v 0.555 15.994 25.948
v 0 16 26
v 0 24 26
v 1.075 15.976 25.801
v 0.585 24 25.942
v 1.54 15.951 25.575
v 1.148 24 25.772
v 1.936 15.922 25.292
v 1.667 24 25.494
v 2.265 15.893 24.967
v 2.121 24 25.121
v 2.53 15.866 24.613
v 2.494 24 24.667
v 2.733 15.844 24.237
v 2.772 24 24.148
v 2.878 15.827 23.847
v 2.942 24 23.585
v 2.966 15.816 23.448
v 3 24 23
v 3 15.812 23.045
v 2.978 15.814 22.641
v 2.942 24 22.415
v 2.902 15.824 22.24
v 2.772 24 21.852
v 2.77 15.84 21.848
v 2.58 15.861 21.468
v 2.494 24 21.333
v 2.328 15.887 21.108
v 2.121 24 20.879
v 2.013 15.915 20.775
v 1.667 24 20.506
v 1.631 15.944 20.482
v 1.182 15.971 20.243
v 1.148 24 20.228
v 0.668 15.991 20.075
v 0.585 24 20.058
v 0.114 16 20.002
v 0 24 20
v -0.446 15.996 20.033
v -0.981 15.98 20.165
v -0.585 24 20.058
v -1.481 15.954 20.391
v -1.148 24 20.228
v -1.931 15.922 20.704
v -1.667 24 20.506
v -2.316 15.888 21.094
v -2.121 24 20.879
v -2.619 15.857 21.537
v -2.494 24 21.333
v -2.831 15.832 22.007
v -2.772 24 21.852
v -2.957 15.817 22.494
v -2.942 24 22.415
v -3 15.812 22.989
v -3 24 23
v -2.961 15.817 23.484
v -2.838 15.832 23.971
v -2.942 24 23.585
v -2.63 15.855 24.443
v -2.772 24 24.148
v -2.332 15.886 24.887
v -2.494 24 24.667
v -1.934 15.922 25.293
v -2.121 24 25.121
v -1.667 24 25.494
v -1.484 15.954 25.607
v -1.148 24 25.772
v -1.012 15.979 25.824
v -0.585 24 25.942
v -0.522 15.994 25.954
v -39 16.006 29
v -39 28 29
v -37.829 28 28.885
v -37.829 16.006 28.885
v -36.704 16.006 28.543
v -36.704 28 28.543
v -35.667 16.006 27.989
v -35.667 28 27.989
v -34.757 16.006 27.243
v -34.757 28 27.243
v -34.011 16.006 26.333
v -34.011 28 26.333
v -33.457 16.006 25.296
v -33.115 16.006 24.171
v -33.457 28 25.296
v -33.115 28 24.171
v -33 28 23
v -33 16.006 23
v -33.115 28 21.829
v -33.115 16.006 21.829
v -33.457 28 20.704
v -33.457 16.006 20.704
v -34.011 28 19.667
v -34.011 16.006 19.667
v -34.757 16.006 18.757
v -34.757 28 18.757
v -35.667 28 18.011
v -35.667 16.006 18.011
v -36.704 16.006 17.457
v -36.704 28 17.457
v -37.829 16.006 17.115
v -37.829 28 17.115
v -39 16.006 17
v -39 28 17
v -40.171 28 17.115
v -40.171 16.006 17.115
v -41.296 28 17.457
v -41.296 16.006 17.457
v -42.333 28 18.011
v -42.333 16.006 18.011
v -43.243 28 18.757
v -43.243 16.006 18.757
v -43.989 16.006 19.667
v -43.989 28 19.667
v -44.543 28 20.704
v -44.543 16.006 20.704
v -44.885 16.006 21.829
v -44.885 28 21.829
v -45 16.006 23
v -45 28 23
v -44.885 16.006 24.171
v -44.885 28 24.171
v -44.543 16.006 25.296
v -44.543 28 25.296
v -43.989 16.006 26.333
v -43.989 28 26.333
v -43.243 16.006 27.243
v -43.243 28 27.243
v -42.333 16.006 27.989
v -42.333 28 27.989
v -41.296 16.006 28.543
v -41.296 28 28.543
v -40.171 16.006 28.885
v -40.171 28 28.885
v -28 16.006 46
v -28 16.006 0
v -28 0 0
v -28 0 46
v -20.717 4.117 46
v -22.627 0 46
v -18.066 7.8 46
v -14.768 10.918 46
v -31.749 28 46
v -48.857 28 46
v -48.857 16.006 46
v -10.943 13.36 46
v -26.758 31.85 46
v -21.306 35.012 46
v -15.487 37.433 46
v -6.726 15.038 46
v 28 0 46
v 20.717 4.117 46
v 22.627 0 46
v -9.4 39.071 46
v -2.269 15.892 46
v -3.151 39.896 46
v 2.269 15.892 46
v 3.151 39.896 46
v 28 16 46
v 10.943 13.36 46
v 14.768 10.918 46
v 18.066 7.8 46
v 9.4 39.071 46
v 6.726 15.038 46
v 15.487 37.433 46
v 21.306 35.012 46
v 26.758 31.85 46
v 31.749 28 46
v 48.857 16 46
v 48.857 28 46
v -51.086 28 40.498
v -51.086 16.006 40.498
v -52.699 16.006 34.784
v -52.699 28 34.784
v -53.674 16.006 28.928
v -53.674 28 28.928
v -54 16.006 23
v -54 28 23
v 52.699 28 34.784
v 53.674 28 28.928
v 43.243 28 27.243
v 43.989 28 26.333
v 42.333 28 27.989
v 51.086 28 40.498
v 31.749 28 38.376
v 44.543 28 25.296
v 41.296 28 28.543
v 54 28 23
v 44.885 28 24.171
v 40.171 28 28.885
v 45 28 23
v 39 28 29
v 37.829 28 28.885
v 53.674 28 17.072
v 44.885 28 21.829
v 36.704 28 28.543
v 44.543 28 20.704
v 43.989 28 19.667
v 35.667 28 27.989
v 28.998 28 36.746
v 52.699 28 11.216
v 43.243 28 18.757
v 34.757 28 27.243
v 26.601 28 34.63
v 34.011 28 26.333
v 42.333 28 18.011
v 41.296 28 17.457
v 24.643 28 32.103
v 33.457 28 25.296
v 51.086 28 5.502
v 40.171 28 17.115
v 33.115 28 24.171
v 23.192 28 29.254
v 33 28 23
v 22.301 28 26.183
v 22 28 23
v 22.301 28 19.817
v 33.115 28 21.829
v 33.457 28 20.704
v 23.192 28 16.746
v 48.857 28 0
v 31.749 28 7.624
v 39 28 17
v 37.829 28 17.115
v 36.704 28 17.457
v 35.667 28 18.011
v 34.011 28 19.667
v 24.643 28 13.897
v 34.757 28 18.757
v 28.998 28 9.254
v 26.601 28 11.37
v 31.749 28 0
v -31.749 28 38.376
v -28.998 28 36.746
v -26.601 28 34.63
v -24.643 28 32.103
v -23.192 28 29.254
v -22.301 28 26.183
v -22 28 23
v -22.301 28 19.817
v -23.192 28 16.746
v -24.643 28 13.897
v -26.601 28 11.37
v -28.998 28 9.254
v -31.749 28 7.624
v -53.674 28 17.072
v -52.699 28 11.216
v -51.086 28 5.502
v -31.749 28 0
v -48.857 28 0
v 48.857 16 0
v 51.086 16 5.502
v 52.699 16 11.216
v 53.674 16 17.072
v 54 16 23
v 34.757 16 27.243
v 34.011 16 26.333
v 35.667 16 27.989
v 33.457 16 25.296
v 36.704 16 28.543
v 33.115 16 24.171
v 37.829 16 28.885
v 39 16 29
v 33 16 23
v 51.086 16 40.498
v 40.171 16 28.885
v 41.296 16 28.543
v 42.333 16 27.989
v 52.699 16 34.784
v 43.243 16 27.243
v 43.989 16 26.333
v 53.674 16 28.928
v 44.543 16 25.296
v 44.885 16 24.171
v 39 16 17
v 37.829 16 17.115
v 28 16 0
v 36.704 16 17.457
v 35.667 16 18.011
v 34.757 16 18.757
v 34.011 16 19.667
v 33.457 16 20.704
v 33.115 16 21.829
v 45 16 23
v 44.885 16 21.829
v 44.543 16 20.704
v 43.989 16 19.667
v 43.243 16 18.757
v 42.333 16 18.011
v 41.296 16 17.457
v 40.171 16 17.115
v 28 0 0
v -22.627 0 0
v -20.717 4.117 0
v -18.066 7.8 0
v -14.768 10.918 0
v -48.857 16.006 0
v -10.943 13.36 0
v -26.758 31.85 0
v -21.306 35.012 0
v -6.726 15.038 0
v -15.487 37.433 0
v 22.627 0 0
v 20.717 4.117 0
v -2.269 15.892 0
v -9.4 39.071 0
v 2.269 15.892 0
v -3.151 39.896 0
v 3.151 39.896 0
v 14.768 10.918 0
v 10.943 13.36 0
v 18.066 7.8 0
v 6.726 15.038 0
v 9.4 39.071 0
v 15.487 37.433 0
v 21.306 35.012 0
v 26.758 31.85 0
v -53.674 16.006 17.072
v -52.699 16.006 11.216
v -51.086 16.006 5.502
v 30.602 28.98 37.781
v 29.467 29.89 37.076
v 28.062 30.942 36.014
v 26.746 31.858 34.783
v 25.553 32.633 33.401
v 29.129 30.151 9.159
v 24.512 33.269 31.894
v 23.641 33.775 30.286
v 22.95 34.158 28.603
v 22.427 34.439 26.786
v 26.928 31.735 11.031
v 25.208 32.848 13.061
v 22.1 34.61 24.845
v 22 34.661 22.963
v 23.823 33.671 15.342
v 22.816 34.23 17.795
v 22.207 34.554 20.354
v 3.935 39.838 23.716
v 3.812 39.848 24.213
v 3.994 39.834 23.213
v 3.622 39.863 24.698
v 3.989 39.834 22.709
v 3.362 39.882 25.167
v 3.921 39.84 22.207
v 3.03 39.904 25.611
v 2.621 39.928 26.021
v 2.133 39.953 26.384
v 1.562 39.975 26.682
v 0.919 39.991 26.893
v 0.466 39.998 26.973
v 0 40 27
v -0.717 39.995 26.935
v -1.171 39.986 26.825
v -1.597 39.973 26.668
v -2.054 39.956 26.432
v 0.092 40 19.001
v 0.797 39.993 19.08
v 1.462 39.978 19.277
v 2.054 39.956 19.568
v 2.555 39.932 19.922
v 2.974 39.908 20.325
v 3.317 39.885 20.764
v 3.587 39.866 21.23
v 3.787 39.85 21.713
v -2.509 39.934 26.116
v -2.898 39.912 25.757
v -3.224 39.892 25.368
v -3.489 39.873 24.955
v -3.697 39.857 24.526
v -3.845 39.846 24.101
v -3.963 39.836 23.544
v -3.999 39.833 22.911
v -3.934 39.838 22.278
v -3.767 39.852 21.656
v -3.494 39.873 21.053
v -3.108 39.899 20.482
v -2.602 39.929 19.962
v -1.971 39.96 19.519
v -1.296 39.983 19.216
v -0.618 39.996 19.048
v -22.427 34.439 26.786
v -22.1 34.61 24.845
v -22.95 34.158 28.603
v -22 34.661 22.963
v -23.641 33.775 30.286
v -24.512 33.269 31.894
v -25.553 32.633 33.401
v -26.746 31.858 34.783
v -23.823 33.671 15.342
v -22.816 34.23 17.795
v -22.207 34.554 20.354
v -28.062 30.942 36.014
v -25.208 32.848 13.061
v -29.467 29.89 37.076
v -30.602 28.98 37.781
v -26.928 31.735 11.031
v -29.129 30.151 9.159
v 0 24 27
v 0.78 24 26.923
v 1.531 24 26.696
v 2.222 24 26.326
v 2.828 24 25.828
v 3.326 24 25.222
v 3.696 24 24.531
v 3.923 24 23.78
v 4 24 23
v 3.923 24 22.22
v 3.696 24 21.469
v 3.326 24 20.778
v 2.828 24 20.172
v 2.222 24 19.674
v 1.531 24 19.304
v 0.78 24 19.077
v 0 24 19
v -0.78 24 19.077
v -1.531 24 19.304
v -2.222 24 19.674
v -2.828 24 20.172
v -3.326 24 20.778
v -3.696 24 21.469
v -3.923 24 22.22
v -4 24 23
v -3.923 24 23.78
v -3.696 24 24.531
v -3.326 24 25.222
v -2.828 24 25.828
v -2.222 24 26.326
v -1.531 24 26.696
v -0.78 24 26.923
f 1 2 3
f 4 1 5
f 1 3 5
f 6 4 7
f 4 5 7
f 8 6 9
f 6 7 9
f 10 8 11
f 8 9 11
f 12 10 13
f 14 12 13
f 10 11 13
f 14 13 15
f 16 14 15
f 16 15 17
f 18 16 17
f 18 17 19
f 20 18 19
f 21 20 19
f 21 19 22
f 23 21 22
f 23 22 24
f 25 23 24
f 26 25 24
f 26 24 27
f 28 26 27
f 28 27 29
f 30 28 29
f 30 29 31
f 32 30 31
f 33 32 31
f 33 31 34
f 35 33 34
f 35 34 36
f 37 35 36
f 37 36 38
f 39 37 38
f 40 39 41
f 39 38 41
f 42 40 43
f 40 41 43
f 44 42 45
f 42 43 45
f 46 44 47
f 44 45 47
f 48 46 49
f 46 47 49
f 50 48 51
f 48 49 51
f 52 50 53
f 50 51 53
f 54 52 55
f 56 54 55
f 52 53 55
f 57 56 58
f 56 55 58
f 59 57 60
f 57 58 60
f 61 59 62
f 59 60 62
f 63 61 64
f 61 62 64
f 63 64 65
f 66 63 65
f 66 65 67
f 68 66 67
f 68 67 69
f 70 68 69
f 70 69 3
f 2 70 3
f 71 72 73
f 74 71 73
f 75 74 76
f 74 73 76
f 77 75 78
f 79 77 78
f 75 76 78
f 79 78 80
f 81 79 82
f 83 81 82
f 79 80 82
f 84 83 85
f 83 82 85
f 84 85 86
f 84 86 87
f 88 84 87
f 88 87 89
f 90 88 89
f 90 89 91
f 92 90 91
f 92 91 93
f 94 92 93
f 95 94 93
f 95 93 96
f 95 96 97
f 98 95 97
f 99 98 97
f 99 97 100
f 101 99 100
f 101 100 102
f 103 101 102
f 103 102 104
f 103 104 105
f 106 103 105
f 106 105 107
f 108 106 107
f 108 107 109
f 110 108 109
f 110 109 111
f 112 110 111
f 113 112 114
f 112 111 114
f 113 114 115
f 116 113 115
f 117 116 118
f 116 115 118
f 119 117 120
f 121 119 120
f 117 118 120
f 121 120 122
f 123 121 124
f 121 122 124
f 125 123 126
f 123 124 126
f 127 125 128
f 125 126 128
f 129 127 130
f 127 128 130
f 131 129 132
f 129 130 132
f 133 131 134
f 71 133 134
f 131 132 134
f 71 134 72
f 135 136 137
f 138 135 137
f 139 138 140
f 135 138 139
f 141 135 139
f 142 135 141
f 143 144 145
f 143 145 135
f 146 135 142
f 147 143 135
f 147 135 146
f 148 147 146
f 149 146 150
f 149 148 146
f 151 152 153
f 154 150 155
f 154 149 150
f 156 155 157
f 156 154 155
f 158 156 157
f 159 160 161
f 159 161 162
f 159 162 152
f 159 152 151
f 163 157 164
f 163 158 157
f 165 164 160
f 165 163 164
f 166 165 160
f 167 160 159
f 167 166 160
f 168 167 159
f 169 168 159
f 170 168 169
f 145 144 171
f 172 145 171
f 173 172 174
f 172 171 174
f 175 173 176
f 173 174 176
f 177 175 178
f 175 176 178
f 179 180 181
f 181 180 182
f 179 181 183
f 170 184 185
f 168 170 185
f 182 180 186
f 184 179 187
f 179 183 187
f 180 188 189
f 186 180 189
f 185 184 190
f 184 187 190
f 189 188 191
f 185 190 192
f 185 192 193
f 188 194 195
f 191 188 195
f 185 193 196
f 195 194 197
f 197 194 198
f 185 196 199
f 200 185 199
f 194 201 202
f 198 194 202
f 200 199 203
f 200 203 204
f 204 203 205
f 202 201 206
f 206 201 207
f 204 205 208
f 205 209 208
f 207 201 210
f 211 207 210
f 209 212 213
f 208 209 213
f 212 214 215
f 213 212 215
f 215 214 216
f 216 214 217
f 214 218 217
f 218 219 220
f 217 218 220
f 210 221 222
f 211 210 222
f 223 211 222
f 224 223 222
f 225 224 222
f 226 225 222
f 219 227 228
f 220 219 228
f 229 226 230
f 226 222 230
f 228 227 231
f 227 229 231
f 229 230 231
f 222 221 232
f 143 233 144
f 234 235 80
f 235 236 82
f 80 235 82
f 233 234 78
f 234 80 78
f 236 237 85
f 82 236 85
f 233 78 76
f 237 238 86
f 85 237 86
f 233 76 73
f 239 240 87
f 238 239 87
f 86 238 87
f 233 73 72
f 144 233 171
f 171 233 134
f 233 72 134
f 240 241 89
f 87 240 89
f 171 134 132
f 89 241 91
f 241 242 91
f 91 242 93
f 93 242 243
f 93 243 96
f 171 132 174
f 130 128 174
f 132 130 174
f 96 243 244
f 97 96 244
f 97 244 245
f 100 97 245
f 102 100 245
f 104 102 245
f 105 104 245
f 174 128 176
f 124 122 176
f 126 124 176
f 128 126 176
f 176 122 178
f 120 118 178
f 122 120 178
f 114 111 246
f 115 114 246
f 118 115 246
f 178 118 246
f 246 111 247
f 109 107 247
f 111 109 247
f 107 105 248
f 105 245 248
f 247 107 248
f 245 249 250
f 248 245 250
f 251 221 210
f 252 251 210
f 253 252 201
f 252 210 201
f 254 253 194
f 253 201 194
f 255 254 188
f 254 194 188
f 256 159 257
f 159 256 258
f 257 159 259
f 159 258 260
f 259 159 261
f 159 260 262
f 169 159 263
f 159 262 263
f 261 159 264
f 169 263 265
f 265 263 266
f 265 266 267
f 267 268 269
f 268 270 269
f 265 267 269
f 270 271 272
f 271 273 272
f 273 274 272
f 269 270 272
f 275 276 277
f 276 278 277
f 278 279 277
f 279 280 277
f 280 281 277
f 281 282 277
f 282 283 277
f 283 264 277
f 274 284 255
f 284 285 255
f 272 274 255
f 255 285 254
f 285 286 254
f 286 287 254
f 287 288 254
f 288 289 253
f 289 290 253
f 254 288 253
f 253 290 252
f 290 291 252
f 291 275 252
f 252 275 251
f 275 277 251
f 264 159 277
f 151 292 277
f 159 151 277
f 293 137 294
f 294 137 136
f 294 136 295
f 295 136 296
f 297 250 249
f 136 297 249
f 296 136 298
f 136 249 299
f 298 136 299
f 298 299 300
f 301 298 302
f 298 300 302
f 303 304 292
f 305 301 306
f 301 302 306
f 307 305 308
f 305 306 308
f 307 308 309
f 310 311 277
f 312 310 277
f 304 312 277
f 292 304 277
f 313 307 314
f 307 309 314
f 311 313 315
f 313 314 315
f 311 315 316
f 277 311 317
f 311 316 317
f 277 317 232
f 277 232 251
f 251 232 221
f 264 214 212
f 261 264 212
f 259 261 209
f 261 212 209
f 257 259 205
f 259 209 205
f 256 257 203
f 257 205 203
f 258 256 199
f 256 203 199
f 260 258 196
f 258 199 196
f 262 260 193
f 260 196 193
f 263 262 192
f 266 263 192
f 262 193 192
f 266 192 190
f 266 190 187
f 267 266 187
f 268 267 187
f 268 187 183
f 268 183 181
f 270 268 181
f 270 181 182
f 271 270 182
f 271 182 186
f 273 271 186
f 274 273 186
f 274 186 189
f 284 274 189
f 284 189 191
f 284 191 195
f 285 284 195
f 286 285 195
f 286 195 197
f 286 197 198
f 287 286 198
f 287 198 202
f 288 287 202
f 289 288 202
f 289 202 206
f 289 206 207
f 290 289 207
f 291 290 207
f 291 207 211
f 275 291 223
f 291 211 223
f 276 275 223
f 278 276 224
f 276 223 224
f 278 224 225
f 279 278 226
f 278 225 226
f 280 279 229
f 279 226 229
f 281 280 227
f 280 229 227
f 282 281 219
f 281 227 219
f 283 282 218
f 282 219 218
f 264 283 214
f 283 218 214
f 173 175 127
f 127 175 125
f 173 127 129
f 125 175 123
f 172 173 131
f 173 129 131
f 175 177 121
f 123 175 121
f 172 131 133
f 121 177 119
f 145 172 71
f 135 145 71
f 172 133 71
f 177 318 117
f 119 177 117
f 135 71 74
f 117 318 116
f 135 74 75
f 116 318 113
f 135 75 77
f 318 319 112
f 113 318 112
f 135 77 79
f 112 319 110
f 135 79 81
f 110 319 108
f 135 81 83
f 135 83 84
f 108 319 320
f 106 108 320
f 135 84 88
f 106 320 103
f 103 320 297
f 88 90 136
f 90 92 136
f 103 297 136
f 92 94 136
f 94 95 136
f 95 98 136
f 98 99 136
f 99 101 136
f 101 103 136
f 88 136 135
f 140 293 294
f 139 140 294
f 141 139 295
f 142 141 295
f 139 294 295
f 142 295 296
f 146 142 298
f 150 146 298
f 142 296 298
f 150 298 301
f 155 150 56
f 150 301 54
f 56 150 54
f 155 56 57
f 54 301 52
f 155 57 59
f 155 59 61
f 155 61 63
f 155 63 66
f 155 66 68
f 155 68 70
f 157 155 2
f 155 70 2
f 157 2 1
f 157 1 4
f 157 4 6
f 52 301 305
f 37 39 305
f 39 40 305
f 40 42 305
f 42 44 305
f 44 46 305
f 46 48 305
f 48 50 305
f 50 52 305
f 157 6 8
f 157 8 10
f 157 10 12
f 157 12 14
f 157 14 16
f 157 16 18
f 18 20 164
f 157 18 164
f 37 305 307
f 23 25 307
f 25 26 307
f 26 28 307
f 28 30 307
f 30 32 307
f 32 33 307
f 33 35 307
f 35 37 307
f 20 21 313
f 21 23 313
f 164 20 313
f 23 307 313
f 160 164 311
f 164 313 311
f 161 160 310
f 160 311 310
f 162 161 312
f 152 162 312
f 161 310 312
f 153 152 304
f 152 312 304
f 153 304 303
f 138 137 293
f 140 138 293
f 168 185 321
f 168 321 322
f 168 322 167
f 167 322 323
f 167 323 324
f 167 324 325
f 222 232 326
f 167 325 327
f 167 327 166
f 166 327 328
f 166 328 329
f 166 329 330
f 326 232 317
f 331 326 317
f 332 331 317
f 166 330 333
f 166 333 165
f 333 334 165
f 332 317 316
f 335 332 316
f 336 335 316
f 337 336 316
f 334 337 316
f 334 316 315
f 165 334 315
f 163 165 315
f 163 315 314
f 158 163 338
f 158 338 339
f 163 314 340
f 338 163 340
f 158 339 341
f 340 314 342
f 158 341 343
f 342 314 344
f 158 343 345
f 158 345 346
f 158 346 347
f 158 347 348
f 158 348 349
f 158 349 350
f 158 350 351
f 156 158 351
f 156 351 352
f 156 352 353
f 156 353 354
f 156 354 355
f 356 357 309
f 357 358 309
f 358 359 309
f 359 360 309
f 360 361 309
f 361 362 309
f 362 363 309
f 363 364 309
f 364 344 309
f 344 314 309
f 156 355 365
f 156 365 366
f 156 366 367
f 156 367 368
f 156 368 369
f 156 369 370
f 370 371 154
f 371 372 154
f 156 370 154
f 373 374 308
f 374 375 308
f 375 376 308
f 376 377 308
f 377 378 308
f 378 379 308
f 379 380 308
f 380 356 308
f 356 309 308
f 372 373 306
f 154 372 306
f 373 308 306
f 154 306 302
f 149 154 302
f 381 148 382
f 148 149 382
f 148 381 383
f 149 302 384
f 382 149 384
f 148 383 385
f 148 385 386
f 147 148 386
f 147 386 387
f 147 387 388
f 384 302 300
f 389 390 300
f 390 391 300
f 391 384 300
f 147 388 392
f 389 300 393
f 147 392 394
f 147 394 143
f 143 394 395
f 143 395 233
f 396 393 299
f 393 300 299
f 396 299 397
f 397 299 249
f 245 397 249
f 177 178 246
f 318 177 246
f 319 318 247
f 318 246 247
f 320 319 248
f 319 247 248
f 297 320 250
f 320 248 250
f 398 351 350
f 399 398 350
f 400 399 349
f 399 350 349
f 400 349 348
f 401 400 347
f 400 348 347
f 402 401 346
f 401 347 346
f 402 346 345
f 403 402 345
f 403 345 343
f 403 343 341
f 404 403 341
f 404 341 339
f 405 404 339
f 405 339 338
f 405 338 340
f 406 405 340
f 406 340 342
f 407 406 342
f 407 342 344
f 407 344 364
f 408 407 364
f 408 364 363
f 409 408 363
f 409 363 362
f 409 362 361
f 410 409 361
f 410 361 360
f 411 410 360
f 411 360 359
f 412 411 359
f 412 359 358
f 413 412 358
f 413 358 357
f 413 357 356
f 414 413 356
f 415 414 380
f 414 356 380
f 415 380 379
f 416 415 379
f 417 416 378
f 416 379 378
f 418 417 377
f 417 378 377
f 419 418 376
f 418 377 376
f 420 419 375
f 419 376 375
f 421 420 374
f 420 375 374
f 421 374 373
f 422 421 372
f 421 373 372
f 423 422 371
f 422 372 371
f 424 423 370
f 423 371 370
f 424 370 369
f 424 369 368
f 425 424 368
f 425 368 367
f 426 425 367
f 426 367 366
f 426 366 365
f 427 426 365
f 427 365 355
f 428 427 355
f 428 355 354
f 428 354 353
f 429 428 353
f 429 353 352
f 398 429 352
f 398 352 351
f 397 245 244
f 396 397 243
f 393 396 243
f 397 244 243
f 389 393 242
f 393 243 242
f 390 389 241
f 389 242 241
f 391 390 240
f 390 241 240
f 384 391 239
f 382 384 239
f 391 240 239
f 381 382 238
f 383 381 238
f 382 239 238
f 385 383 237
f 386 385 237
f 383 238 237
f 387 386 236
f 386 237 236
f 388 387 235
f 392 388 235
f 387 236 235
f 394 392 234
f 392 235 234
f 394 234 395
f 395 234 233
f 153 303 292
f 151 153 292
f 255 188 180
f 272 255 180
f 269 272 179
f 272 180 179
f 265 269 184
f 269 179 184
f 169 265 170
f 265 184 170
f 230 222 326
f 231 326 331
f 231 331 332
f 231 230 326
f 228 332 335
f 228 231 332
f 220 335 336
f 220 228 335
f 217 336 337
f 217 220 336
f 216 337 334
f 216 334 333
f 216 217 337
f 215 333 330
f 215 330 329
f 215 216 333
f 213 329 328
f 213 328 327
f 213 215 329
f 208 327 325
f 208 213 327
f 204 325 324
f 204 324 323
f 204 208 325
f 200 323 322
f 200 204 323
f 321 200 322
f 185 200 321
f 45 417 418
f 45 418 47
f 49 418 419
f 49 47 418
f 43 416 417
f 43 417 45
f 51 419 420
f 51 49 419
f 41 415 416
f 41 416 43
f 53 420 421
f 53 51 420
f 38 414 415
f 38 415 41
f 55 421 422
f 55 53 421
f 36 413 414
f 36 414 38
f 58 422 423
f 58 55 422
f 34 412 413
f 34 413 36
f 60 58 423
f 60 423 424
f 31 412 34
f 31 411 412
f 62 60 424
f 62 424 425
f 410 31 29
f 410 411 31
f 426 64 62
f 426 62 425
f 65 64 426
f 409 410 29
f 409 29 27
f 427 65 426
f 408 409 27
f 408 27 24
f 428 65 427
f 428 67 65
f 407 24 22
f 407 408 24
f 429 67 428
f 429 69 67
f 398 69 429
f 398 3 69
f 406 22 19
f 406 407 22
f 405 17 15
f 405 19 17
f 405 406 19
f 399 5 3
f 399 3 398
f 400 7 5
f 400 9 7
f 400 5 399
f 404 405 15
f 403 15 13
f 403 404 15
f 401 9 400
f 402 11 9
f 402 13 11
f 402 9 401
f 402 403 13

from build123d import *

# Parameters (mm, degrees)
BOSS_EXTRUDE1_DEPTH = 46
CUT_EXTRUDE1_DEPTH  = 77.26270386
SKETCH3_R           = 6
CUT_EXTRUDE2_DEPTH  = 77.26270386
SKETCH5_R           = 3
CUT_EXTRUDE3_DEPTH  = 82.437092286
SKETCH6_R           = 4
CUT_EXTRUDE4_DEPTH  = 16
CUT_EXTRUDE5_DEPTH  = 77.262703957


with BuildPart() as part:
    # Sketch1 → Boss-Extrude1 (new body)
    with BuildSketch(Plane.XY):
        with BuildLine():
            Line((22.627416998, 0), (28, 0))
            Line((28, 0), (28, 16))
            Line((28, 16), (54, 16))
            Line((54, 16), (54, 28))
            Line((54, 28), (31.749015733, 28))
            ThreePointArc((31.749015733, 28), (0, 40), (-31.749015733, 28))
            Line((-31.749015733, 28), (-54, 28))
            Line((-54, 28), (-54, 16.005791269))
            Line((-54, 16.005791269), (-28, 16.005791269))
            Line((-28, 16.005791269), (-28, 0))
            Line((-28, 0), (-22.627416998, 0))
            ThreePointArc((-22.627416998, 0), (0, 16), (22.627416998, 0))
        make_face()
    extrude(amount=BOSS_EXTRUDE1_DEPTH)

    # Sketch2 → Cut-Extrude1 (cut, through all)
    with BuildSketch(Plane(origin=(0, 28, 0), x_dir=(1, 0, 0), z_dir=(0, 1, 0))):
        with BuildLine():
            Line((54, -46), (54, -23))
            ThreePointArc((54, -23), (52.698550436, -34.784005345), (48.856934001, -46))
            Line((48.856934001, -46), (54, -46))
        make_face()
        with BuildLine():
            Line((54, 0), (48.856934001, 0))
            ThreePointArc((48.856934001, 0), (52.698550436, -11.215994655), (54, -23))
            Line((54, -23), (54, 0))
        make_face()
        with BuildLine():
            ThreePointArc((-54, -23.000000162), (-52.698550453, -11.215994734), (-48.856934001, 0))
            Line((-48.856934001, 0), (-54, 0))
            Line((-54, 0), (-54, -23.000000162))
        make_face()
        with BuildLine():
            ThreePointArc((-48.856934001, -46), (-52.698550418, -34.784005424), (-54, -23.000000162))
            Line((-54, -23.000000162), (-54, -46))
            Line((-54, -46), (-48.856934001, -46))
        make_face()
    extrude(amount=-CUT_EXTRUDE1_DEPTH, mode=Mode.SUBTRACT)

    # Sketch3 → Cut-Extrude2 (cut, through all)
    with BuildSketch(Plane(origin=(0, 28, 0), x_dir=(1, 0, 0), z_dir=(0, 1, 0))):
        with Locations(Location((39, -23, 0), (0, 0, 180))):
            Circle(SKETCH3_R)
        with Locations(Location((-39, -23, 0), (0, 0, 270))):
            Circle(SKETCH3_R)
    extrude(amount=-CUT_EXTRUDE2_DEPTH, mode=Mode.SUBTRACT)

    # Sketch5 → Cut-Extrude3 (cut, through all)
    with BuildSketch(Plane(origin=(0, 40, 0), x_dir=(1, 0, 0), z_dir=(0, 1, 0))):
        with Locations(Location((0, -23, 0), (0, 0, 270))):
            Circle(SKETCH5_R)
    extrude(amount=-CUT_EXTRUDE3_DEPTH, mode=Mode.SUBTRACT)

    # Sketch6 → Cut-Extrude4 (cut)
    with BuildSketch(Plane(origin=(0, 40, 0), x_dir=(1, 0, 0), z_dir=(0, 1, 0))):
        with Locations(Location((0, -23, 0), (0, 0, 270))):
            Circle(SKETCH6_R)
    extrude(amount=-CUT_EXTRUDE4_DEPTH, mode=Mode.SUBTRACT)

    # Sketch7 → Cut-Extrude5 (cut, through all)
    with BuildSketch(Plane(origin=(0, 28, 0), x_dir=(1, 0, 0), z_dir=(0, 1, 0))):
        with BuildLine():
            ThreePointArc((-31.749015733, -7.623939804), (-22, -23), (-31.749015733, -38.376060196))
            Line((-31.749015733, -38.376060196), (-31.749015733, -7.623939804))
        make_face()
        with BuildLine():
            Line((31.749015733, -38.376060196), (31.749015733, -7.623939804))
            ThreePointArc((31.749015733, -7.623939804), (22, -23), (31.749015733, -38.376060196))
        make_face()
    extrude(amount=CUT_EXTRUDE5_DEPTH, mode=Mode.SUBTRACT)


solid = part.part
